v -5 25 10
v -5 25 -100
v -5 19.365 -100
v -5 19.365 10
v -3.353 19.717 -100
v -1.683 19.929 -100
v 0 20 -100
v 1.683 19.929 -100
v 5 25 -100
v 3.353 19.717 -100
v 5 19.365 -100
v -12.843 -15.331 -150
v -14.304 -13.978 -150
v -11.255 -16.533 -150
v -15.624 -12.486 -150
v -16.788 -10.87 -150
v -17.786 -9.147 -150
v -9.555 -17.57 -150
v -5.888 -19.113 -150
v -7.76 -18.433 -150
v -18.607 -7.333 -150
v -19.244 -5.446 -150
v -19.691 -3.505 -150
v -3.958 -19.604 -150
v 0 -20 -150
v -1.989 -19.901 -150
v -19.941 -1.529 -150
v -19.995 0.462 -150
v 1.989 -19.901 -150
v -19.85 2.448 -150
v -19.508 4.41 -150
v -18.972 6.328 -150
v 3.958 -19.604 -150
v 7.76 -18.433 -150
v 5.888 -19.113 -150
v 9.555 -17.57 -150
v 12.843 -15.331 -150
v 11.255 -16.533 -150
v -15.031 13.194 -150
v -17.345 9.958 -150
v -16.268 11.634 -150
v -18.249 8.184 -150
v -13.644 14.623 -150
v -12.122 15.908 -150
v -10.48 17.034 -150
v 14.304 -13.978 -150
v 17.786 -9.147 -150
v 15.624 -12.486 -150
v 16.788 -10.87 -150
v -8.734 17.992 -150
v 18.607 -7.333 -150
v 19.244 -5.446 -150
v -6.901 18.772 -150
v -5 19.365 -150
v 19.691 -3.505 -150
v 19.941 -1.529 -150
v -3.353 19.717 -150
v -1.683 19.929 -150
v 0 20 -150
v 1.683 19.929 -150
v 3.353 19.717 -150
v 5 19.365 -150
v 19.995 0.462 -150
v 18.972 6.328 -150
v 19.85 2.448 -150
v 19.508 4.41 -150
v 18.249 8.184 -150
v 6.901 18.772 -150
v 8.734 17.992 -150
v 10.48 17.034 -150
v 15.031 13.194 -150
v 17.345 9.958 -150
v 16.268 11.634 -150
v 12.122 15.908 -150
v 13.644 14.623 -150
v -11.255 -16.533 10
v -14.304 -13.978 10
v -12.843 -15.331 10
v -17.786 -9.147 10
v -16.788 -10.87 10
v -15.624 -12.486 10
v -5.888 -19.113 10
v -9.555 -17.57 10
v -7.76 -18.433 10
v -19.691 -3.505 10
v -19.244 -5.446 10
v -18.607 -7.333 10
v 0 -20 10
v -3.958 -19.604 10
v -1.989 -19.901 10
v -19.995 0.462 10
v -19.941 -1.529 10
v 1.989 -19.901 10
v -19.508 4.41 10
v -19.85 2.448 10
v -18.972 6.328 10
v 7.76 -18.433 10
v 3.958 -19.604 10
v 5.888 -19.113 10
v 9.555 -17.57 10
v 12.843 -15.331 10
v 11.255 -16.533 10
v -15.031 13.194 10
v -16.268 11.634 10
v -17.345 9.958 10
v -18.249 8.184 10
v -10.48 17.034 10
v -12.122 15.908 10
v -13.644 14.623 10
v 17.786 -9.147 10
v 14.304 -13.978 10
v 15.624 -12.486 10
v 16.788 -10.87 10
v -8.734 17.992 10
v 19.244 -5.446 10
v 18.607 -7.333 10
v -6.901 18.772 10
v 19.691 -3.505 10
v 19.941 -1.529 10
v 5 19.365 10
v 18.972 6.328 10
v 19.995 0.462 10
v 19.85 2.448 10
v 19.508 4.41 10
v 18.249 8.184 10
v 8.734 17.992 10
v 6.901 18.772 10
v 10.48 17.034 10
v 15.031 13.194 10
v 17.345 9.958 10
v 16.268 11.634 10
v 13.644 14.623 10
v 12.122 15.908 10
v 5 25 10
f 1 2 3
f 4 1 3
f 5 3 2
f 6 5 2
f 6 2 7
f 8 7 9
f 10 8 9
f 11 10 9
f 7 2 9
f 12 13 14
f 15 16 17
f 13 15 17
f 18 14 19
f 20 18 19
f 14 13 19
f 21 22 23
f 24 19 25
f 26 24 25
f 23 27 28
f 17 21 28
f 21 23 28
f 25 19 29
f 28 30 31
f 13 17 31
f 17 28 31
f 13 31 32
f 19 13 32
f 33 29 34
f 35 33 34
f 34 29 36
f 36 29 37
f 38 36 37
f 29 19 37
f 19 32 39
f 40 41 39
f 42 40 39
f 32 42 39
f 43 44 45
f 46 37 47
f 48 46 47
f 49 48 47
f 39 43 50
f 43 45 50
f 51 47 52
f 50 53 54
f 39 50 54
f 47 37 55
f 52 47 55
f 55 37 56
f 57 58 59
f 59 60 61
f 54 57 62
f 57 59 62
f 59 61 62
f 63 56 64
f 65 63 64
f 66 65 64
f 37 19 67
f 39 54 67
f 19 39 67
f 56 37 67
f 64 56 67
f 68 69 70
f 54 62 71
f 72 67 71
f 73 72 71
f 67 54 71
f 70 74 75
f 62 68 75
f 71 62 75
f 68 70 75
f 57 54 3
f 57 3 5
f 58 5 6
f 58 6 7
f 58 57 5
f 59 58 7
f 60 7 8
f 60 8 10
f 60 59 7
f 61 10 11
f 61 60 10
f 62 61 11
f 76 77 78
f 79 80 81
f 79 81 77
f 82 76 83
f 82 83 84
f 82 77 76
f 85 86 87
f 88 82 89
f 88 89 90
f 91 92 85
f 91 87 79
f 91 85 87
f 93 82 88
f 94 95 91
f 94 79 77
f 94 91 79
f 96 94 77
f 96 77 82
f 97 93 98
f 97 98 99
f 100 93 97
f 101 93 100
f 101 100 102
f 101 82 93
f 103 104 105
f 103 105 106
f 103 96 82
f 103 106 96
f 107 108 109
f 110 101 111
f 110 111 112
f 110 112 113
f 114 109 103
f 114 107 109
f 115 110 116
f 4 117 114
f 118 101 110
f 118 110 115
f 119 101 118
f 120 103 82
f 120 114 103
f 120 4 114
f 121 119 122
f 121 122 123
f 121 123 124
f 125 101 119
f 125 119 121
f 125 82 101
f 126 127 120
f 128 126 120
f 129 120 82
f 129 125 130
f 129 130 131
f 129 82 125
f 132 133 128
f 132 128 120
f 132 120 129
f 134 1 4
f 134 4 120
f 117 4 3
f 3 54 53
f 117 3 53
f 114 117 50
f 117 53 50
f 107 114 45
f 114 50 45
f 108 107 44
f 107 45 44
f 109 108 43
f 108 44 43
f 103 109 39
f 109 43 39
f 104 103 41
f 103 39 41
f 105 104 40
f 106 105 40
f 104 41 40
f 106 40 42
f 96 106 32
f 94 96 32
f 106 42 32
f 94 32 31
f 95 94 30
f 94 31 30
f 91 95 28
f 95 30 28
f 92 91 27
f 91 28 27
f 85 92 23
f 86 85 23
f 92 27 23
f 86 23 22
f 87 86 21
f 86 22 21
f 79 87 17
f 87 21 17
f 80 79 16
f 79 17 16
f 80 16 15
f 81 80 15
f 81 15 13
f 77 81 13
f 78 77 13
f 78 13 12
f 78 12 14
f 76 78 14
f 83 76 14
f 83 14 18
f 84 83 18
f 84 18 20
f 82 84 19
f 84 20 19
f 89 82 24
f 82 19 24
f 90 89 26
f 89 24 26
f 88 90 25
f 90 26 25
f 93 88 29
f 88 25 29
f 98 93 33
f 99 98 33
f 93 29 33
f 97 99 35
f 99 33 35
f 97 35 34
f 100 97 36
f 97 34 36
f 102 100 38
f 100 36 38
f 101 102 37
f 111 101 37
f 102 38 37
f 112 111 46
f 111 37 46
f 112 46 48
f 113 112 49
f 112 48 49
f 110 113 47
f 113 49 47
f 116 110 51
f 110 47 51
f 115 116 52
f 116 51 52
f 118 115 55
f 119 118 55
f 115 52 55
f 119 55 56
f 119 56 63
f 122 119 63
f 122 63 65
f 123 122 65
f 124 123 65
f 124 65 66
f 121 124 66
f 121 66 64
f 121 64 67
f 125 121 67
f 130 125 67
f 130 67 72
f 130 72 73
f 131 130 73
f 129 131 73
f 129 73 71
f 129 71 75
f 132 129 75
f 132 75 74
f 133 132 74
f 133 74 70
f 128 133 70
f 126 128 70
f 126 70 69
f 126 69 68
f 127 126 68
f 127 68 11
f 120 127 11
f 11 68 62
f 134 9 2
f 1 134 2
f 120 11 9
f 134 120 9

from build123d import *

# Parameters (mm, degrees)
EXTRUDE1_DEPTH      = 10
EXTRUDE1_DEPTH_BACK = 150
CUT_EXTRUDE1_DEPTH  = 50


with BuildPart() as part:
    # Sketch1 → Extrude1 (new, two sides: drawn at the far end of the back side and taken through both)
    with BuildSketch(Plane.XY.offset(-EXTRUDE1_DEPTH_BACK)):
        with BuildLine():
            Line((-5, 25), (-5, 19.364916731))
            ThreePointArc((-5, 19.364916731), (0, -20), (5, 19.364916731))
            Line((5, 19.364916731), (5, 25))
            Line((5, 25), (-5, 25))
        make_face()
    extrude(amount=EXTRUDE1_DEPTH + EXTRUDE1_DEPTH_BACK)

    # Sketch2 → Cut-Extrude1 (cut)
    with BuildSketch(Plane(origin=(0, 0, -150), x_dir=(-1, 0, 0), z_dir=(0, 0, -1))):
        with BuildLine():
            Line((-5, 19.364916731), (-5, 25))
            Line((-5, 25), (5, 25))
            Line((5, 25), (5, 19.364916731))
            ThreePointArc((5, 19.364916731), (0, 20), (-5, 19.364916731))
        make_face()
    extrude(amount=-CUT_EXTRUDE1_DEPTH, mode=Mode.SUBTRACT)


solid = part.part
